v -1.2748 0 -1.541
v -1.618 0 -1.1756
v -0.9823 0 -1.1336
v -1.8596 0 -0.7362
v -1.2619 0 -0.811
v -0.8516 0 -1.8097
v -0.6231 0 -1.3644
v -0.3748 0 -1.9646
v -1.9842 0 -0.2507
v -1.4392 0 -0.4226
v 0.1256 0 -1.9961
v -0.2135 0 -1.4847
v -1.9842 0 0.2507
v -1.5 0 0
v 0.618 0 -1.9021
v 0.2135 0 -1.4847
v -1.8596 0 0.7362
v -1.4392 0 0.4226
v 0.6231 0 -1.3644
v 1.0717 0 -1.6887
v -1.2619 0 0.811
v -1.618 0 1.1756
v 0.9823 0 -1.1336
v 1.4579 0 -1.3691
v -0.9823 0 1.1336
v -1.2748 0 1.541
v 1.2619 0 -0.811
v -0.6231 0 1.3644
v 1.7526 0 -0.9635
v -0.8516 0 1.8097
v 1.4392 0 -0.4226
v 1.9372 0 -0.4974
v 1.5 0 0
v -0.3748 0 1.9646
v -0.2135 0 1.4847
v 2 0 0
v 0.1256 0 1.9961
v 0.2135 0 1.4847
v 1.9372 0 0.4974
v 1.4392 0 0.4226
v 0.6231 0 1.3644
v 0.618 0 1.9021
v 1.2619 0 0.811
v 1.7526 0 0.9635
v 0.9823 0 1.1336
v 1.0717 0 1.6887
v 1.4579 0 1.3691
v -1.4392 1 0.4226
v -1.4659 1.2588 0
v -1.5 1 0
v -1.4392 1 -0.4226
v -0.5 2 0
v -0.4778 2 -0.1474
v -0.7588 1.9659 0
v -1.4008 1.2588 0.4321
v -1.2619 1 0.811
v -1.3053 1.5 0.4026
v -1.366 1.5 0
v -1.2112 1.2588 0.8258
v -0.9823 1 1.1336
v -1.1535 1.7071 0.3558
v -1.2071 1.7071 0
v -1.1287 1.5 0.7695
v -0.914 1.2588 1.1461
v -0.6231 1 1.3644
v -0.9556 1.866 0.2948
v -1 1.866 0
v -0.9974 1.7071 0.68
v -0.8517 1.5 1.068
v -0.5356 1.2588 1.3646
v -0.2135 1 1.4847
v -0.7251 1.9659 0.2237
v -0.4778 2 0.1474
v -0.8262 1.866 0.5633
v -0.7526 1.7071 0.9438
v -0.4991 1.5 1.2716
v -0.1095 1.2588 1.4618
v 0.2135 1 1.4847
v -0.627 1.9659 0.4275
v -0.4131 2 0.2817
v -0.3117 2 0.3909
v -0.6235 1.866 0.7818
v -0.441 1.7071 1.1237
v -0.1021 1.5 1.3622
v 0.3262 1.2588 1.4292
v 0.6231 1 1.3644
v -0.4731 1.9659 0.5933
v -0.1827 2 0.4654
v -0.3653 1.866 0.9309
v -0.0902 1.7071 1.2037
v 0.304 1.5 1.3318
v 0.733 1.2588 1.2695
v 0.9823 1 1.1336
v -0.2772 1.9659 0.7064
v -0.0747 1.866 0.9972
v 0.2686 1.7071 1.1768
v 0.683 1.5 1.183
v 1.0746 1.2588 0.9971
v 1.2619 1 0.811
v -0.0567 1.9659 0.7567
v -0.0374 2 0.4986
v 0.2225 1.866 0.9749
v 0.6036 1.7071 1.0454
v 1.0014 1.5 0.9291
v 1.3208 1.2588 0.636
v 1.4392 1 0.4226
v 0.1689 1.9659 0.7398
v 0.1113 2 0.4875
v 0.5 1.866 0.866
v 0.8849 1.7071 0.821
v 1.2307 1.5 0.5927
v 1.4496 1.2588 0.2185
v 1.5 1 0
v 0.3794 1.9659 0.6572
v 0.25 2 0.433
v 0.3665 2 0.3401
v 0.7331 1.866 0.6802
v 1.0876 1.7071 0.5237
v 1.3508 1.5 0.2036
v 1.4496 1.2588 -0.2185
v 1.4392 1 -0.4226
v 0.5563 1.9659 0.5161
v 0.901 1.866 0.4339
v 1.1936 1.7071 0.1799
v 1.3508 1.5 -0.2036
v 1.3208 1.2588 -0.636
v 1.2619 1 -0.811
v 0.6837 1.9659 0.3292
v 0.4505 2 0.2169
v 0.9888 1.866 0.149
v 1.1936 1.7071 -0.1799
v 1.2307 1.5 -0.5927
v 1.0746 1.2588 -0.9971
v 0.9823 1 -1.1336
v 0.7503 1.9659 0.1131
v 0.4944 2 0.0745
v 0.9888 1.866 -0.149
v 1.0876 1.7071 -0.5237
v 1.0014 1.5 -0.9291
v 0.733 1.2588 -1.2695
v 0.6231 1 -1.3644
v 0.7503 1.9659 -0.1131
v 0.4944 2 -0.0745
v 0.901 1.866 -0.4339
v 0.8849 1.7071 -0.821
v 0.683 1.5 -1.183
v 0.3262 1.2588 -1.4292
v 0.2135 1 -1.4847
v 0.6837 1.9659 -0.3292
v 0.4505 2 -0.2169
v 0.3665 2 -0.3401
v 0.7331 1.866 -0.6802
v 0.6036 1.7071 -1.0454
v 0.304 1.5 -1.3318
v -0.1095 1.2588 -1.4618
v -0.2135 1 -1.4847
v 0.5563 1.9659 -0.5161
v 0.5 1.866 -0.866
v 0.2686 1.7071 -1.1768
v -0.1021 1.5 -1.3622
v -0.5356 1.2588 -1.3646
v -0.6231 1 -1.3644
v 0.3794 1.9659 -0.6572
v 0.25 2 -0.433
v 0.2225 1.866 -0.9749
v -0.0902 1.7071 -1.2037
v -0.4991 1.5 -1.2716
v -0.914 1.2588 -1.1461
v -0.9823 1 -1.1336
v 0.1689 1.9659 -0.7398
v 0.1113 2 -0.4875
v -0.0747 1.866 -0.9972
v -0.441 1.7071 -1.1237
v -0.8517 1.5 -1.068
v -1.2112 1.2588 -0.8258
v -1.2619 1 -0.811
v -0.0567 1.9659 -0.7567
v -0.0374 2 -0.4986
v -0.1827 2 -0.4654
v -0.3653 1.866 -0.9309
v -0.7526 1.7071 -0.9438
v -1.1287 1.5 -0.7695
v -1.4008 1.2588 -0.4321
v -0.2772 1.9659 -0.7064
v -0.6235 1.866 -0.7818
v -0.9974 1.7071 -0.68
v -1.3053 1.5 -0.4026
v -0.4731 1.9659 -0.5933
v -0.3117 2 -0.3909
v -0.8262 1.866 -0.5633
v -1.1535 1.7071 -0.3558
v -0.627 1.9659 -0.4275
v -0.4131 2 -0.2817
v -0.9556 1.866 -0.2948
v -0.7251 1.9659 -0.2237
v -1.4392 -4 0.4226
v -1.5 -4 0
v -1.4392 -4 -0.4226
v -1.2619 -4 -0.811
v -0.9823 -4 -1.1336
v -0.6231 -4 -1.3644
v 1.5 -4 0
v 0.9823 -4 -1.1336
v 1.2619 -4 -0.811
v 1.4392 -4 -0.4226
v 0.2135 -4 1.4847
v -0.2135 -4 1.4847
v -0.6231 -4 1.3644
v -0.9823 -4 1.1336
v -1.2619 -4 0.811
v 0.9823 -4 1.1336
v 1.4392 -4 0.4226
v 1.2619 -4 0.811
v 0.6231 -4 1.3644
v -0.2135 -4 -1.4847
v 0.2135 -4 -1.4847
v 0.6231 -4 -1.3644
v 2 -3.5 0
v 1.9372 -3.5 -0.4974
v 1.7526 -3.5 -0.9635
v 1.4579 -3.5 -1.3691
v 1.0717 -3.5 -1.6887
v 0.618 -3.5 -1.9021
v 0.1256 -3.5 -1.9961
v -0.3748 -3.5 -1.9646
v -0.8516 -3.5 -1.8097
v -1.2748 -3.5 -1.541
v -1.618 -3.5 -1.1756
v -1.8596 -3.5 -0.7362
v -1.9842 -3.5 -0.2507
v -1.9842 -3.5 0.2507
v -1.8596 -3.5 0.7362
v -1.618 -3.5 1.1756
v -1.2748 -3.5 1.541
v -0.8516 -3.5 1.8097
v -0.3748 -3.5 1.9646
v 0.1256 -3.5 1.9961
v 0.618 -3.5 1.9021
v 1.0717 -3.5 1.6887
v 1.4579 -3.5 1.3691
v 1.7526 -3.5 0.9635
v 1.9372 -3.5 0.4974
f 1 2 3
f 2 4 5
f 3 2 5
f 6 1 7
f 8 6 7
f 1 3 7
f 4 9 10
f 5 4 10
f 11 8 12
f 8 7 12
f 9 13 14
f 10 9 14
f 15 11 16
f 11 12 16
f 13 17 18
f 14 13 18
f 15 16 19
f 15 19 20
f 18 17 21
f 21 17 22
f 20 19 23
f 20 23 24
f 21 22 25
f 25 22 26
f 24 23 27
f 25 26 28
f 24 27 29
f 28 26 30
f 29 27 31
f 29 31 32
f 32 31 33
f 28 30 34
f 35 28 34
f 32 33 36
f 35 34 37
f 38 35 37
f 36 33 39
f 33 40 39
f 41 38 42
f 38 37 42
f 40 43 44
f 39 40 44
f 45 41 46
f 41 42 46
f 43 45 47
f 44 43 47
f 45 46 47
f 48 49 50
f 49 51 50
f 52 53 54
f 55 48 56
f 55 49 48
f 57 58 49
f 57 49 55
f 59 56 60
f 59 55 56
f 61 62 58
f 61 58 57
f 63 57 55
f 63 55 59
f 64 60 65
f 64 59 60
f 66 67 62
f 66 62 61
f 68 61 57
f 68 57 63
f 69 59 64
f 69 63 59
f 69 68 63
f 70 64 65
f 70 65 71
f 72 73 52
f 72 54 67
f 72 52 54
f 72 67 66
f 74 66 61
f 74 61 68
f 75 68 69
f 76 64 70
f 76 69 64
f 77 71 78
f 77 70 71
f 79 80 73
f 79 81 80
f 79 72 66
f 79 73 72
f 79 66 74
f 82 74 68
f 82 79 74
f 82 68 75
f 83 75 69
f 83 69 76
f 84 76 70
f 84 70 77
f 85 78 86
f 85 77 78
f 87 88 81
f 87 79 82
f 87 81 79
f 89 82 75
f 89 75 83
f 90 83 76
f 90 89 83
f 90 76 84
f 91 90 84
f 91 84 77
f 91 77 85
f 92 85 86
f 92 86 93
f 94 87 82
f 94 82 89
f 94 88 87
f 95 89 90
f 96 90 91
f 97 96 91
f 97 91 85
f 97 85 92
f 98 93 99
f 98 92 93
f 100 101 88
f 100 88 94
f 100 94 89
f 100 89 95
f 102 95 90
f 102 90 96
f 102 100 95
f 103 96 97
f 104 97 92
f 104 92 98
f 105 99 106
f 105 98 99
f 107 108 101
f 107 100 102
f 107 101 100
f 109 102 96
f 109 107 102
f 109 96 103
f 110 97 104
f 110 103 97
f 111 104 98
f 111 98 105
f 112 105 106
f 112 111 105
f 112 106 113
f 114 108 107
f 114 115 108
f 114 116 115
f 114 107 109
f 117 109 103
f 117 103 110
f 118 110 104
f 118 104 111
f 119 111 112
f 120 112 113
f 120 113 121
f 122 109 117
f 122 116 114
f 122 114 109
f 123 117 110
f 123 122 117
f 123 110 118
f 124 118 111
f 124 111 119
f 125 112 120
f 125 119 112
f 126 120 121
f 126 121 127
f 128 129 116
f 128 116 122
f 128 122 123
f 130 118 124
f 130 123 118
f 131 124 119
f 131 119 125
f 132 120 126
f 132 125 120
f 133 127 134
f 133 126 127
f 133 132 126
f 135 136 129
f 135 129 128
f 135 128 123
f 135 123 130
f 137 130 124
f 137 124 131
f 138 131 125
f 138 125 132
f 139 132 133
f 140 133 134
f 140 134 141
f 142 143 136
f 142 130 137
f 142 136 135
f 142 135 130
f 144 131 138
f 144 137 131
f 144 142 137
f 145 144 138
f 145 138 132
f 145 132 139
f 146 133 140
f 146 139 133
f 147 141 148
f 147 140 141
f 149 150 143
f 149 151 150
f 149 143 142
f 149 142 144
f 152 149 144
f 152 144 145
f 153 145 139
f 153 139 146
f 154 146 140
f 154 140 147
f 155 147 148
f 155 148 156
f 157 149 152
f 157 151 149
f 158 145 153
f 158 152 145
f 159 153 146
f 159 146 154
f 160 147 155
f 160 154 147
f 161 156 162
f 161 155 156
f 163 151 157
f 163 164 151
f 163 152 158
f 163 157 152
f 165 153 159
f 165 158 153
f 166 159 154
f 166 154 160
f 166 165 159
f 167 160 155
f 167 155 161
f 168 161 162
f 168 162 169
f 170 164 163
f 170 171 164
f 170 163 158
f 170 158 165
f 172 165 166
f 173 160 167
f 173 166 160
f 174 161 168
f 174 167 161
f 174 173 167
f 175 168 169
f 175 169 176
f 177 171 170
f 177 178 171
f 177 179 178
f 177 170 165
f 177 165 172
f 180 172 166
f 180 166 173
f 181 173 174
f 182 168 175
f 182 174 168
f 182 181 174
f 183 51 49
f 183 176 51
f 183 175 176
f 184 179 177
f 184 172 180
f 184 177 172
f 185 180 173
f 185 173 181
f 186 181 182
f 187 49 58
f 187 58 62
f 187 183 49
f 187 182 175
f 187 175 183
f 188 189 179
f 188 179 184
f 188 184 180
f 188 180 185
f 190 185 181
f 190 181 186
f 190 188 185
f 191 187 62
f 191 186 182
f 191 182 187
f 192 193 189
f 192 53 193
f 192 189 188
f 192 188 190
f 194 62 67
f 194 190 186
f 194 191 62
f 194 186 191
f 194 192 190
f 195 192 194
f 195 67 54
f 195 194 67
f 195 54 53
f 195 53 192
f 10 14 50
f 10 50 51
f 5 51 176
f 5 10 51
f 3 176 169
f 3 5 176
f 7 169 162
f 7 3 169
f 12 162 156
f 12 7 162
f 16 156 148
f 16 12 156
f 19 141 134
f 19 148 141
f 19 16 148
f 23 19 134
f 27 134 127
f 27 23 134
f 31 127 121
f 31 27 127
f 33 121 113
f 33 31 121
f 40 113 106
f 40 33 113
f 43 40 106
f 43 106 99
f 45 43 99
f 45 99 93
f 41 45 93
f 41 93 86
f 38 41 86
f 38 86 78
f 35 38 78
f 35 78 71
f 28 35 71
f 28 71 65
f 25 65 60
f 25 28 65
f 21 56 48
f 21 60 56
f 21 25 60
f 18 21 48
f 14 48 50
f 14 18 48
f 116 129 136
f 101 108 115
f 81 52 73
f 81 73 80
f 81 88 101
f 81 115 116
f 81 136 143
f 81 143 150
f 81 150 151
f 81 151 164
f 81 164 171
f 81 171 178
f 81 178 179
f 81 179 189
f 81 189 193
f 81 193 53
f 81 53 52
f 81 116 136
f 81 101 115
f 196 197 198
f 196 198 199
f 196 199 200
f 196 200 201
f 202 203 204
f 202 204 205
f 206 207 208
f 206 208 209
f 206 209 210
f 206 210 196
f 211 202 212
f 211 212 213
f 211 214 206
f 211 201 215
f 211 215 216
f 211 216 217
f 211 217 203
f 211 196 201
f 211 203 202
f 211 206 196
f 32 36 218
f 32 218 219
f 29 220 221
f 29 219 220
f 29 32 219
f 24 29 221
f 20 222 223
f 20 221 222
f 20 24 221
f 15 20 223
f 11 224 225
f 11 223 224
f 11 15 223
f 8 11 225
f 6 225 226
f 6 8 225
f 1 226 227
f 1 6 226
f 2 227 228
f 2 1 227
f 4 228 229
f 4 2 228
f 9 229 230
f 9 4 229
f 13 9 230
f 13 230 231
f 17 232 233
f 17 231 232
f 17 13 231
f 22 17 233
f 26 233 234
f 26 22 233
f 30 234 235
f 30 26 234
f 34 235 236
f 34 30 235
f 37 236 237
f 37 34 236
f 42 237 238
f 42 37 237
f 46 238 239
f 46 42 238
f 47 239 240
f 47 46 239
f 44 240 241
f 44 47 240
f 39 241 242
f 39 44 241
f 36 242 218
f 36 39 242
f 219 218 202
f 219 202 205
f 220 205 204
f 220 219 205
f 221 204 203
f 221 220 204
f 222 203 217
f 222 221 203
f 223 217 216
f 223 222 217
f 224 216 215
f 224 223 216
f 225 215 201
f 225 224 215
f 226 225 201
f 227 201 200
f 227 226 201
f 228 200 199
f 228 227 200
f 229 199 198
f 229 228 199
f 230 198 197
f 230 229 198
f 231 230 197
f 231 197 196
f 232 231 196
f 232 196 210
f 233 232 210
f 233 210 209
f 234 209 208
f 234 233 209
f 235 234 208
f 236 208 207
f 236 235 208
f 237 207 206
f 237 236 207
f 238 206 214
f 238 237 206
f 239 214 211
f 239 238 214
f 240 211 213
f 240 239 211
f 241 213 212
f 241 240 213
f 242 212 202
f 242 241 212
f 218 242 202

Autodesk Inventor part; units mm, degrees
ref_plane "YZ Plane" through (0, 0, 0) normal (1, 0, 0) x (0, 1, 0)
ref_plane "XZ Plane" through (0, 0, 0) normal (0, 1, 0) x (-1, 0, 0)
ref_plane "XY Plane" through (0, 0, 0) normal (0, 0, 1) x (1, 0, 0)
sketch "Sketch1" plane through (0, 0, 0) normal (0, 1, 0) x (-1, 0, 0)
  circle A0 centre (0, 0) radius 1.5
  dimension "d0" = 3
extrude "Extrusion1" add sketch "Sketch1" along normal blind 2
sketch "Sketch2" plane through (0, 0, 0) normal (0, -1, 0) x (1, 0, 0)
  circle A0 centre (0, 0) radius 2
  dimension "d3" = 4
extrude "Extrusion2" add sketch "Sketch2" along normal blind 4
fillet "Fillet1" radius 1 1 edges at (1.5, 2, 0)
chamfer "Chamfer1" distance 0.5 angle 45 1 edges at (-2, -4, 0)
properties part number "Circular Module"
